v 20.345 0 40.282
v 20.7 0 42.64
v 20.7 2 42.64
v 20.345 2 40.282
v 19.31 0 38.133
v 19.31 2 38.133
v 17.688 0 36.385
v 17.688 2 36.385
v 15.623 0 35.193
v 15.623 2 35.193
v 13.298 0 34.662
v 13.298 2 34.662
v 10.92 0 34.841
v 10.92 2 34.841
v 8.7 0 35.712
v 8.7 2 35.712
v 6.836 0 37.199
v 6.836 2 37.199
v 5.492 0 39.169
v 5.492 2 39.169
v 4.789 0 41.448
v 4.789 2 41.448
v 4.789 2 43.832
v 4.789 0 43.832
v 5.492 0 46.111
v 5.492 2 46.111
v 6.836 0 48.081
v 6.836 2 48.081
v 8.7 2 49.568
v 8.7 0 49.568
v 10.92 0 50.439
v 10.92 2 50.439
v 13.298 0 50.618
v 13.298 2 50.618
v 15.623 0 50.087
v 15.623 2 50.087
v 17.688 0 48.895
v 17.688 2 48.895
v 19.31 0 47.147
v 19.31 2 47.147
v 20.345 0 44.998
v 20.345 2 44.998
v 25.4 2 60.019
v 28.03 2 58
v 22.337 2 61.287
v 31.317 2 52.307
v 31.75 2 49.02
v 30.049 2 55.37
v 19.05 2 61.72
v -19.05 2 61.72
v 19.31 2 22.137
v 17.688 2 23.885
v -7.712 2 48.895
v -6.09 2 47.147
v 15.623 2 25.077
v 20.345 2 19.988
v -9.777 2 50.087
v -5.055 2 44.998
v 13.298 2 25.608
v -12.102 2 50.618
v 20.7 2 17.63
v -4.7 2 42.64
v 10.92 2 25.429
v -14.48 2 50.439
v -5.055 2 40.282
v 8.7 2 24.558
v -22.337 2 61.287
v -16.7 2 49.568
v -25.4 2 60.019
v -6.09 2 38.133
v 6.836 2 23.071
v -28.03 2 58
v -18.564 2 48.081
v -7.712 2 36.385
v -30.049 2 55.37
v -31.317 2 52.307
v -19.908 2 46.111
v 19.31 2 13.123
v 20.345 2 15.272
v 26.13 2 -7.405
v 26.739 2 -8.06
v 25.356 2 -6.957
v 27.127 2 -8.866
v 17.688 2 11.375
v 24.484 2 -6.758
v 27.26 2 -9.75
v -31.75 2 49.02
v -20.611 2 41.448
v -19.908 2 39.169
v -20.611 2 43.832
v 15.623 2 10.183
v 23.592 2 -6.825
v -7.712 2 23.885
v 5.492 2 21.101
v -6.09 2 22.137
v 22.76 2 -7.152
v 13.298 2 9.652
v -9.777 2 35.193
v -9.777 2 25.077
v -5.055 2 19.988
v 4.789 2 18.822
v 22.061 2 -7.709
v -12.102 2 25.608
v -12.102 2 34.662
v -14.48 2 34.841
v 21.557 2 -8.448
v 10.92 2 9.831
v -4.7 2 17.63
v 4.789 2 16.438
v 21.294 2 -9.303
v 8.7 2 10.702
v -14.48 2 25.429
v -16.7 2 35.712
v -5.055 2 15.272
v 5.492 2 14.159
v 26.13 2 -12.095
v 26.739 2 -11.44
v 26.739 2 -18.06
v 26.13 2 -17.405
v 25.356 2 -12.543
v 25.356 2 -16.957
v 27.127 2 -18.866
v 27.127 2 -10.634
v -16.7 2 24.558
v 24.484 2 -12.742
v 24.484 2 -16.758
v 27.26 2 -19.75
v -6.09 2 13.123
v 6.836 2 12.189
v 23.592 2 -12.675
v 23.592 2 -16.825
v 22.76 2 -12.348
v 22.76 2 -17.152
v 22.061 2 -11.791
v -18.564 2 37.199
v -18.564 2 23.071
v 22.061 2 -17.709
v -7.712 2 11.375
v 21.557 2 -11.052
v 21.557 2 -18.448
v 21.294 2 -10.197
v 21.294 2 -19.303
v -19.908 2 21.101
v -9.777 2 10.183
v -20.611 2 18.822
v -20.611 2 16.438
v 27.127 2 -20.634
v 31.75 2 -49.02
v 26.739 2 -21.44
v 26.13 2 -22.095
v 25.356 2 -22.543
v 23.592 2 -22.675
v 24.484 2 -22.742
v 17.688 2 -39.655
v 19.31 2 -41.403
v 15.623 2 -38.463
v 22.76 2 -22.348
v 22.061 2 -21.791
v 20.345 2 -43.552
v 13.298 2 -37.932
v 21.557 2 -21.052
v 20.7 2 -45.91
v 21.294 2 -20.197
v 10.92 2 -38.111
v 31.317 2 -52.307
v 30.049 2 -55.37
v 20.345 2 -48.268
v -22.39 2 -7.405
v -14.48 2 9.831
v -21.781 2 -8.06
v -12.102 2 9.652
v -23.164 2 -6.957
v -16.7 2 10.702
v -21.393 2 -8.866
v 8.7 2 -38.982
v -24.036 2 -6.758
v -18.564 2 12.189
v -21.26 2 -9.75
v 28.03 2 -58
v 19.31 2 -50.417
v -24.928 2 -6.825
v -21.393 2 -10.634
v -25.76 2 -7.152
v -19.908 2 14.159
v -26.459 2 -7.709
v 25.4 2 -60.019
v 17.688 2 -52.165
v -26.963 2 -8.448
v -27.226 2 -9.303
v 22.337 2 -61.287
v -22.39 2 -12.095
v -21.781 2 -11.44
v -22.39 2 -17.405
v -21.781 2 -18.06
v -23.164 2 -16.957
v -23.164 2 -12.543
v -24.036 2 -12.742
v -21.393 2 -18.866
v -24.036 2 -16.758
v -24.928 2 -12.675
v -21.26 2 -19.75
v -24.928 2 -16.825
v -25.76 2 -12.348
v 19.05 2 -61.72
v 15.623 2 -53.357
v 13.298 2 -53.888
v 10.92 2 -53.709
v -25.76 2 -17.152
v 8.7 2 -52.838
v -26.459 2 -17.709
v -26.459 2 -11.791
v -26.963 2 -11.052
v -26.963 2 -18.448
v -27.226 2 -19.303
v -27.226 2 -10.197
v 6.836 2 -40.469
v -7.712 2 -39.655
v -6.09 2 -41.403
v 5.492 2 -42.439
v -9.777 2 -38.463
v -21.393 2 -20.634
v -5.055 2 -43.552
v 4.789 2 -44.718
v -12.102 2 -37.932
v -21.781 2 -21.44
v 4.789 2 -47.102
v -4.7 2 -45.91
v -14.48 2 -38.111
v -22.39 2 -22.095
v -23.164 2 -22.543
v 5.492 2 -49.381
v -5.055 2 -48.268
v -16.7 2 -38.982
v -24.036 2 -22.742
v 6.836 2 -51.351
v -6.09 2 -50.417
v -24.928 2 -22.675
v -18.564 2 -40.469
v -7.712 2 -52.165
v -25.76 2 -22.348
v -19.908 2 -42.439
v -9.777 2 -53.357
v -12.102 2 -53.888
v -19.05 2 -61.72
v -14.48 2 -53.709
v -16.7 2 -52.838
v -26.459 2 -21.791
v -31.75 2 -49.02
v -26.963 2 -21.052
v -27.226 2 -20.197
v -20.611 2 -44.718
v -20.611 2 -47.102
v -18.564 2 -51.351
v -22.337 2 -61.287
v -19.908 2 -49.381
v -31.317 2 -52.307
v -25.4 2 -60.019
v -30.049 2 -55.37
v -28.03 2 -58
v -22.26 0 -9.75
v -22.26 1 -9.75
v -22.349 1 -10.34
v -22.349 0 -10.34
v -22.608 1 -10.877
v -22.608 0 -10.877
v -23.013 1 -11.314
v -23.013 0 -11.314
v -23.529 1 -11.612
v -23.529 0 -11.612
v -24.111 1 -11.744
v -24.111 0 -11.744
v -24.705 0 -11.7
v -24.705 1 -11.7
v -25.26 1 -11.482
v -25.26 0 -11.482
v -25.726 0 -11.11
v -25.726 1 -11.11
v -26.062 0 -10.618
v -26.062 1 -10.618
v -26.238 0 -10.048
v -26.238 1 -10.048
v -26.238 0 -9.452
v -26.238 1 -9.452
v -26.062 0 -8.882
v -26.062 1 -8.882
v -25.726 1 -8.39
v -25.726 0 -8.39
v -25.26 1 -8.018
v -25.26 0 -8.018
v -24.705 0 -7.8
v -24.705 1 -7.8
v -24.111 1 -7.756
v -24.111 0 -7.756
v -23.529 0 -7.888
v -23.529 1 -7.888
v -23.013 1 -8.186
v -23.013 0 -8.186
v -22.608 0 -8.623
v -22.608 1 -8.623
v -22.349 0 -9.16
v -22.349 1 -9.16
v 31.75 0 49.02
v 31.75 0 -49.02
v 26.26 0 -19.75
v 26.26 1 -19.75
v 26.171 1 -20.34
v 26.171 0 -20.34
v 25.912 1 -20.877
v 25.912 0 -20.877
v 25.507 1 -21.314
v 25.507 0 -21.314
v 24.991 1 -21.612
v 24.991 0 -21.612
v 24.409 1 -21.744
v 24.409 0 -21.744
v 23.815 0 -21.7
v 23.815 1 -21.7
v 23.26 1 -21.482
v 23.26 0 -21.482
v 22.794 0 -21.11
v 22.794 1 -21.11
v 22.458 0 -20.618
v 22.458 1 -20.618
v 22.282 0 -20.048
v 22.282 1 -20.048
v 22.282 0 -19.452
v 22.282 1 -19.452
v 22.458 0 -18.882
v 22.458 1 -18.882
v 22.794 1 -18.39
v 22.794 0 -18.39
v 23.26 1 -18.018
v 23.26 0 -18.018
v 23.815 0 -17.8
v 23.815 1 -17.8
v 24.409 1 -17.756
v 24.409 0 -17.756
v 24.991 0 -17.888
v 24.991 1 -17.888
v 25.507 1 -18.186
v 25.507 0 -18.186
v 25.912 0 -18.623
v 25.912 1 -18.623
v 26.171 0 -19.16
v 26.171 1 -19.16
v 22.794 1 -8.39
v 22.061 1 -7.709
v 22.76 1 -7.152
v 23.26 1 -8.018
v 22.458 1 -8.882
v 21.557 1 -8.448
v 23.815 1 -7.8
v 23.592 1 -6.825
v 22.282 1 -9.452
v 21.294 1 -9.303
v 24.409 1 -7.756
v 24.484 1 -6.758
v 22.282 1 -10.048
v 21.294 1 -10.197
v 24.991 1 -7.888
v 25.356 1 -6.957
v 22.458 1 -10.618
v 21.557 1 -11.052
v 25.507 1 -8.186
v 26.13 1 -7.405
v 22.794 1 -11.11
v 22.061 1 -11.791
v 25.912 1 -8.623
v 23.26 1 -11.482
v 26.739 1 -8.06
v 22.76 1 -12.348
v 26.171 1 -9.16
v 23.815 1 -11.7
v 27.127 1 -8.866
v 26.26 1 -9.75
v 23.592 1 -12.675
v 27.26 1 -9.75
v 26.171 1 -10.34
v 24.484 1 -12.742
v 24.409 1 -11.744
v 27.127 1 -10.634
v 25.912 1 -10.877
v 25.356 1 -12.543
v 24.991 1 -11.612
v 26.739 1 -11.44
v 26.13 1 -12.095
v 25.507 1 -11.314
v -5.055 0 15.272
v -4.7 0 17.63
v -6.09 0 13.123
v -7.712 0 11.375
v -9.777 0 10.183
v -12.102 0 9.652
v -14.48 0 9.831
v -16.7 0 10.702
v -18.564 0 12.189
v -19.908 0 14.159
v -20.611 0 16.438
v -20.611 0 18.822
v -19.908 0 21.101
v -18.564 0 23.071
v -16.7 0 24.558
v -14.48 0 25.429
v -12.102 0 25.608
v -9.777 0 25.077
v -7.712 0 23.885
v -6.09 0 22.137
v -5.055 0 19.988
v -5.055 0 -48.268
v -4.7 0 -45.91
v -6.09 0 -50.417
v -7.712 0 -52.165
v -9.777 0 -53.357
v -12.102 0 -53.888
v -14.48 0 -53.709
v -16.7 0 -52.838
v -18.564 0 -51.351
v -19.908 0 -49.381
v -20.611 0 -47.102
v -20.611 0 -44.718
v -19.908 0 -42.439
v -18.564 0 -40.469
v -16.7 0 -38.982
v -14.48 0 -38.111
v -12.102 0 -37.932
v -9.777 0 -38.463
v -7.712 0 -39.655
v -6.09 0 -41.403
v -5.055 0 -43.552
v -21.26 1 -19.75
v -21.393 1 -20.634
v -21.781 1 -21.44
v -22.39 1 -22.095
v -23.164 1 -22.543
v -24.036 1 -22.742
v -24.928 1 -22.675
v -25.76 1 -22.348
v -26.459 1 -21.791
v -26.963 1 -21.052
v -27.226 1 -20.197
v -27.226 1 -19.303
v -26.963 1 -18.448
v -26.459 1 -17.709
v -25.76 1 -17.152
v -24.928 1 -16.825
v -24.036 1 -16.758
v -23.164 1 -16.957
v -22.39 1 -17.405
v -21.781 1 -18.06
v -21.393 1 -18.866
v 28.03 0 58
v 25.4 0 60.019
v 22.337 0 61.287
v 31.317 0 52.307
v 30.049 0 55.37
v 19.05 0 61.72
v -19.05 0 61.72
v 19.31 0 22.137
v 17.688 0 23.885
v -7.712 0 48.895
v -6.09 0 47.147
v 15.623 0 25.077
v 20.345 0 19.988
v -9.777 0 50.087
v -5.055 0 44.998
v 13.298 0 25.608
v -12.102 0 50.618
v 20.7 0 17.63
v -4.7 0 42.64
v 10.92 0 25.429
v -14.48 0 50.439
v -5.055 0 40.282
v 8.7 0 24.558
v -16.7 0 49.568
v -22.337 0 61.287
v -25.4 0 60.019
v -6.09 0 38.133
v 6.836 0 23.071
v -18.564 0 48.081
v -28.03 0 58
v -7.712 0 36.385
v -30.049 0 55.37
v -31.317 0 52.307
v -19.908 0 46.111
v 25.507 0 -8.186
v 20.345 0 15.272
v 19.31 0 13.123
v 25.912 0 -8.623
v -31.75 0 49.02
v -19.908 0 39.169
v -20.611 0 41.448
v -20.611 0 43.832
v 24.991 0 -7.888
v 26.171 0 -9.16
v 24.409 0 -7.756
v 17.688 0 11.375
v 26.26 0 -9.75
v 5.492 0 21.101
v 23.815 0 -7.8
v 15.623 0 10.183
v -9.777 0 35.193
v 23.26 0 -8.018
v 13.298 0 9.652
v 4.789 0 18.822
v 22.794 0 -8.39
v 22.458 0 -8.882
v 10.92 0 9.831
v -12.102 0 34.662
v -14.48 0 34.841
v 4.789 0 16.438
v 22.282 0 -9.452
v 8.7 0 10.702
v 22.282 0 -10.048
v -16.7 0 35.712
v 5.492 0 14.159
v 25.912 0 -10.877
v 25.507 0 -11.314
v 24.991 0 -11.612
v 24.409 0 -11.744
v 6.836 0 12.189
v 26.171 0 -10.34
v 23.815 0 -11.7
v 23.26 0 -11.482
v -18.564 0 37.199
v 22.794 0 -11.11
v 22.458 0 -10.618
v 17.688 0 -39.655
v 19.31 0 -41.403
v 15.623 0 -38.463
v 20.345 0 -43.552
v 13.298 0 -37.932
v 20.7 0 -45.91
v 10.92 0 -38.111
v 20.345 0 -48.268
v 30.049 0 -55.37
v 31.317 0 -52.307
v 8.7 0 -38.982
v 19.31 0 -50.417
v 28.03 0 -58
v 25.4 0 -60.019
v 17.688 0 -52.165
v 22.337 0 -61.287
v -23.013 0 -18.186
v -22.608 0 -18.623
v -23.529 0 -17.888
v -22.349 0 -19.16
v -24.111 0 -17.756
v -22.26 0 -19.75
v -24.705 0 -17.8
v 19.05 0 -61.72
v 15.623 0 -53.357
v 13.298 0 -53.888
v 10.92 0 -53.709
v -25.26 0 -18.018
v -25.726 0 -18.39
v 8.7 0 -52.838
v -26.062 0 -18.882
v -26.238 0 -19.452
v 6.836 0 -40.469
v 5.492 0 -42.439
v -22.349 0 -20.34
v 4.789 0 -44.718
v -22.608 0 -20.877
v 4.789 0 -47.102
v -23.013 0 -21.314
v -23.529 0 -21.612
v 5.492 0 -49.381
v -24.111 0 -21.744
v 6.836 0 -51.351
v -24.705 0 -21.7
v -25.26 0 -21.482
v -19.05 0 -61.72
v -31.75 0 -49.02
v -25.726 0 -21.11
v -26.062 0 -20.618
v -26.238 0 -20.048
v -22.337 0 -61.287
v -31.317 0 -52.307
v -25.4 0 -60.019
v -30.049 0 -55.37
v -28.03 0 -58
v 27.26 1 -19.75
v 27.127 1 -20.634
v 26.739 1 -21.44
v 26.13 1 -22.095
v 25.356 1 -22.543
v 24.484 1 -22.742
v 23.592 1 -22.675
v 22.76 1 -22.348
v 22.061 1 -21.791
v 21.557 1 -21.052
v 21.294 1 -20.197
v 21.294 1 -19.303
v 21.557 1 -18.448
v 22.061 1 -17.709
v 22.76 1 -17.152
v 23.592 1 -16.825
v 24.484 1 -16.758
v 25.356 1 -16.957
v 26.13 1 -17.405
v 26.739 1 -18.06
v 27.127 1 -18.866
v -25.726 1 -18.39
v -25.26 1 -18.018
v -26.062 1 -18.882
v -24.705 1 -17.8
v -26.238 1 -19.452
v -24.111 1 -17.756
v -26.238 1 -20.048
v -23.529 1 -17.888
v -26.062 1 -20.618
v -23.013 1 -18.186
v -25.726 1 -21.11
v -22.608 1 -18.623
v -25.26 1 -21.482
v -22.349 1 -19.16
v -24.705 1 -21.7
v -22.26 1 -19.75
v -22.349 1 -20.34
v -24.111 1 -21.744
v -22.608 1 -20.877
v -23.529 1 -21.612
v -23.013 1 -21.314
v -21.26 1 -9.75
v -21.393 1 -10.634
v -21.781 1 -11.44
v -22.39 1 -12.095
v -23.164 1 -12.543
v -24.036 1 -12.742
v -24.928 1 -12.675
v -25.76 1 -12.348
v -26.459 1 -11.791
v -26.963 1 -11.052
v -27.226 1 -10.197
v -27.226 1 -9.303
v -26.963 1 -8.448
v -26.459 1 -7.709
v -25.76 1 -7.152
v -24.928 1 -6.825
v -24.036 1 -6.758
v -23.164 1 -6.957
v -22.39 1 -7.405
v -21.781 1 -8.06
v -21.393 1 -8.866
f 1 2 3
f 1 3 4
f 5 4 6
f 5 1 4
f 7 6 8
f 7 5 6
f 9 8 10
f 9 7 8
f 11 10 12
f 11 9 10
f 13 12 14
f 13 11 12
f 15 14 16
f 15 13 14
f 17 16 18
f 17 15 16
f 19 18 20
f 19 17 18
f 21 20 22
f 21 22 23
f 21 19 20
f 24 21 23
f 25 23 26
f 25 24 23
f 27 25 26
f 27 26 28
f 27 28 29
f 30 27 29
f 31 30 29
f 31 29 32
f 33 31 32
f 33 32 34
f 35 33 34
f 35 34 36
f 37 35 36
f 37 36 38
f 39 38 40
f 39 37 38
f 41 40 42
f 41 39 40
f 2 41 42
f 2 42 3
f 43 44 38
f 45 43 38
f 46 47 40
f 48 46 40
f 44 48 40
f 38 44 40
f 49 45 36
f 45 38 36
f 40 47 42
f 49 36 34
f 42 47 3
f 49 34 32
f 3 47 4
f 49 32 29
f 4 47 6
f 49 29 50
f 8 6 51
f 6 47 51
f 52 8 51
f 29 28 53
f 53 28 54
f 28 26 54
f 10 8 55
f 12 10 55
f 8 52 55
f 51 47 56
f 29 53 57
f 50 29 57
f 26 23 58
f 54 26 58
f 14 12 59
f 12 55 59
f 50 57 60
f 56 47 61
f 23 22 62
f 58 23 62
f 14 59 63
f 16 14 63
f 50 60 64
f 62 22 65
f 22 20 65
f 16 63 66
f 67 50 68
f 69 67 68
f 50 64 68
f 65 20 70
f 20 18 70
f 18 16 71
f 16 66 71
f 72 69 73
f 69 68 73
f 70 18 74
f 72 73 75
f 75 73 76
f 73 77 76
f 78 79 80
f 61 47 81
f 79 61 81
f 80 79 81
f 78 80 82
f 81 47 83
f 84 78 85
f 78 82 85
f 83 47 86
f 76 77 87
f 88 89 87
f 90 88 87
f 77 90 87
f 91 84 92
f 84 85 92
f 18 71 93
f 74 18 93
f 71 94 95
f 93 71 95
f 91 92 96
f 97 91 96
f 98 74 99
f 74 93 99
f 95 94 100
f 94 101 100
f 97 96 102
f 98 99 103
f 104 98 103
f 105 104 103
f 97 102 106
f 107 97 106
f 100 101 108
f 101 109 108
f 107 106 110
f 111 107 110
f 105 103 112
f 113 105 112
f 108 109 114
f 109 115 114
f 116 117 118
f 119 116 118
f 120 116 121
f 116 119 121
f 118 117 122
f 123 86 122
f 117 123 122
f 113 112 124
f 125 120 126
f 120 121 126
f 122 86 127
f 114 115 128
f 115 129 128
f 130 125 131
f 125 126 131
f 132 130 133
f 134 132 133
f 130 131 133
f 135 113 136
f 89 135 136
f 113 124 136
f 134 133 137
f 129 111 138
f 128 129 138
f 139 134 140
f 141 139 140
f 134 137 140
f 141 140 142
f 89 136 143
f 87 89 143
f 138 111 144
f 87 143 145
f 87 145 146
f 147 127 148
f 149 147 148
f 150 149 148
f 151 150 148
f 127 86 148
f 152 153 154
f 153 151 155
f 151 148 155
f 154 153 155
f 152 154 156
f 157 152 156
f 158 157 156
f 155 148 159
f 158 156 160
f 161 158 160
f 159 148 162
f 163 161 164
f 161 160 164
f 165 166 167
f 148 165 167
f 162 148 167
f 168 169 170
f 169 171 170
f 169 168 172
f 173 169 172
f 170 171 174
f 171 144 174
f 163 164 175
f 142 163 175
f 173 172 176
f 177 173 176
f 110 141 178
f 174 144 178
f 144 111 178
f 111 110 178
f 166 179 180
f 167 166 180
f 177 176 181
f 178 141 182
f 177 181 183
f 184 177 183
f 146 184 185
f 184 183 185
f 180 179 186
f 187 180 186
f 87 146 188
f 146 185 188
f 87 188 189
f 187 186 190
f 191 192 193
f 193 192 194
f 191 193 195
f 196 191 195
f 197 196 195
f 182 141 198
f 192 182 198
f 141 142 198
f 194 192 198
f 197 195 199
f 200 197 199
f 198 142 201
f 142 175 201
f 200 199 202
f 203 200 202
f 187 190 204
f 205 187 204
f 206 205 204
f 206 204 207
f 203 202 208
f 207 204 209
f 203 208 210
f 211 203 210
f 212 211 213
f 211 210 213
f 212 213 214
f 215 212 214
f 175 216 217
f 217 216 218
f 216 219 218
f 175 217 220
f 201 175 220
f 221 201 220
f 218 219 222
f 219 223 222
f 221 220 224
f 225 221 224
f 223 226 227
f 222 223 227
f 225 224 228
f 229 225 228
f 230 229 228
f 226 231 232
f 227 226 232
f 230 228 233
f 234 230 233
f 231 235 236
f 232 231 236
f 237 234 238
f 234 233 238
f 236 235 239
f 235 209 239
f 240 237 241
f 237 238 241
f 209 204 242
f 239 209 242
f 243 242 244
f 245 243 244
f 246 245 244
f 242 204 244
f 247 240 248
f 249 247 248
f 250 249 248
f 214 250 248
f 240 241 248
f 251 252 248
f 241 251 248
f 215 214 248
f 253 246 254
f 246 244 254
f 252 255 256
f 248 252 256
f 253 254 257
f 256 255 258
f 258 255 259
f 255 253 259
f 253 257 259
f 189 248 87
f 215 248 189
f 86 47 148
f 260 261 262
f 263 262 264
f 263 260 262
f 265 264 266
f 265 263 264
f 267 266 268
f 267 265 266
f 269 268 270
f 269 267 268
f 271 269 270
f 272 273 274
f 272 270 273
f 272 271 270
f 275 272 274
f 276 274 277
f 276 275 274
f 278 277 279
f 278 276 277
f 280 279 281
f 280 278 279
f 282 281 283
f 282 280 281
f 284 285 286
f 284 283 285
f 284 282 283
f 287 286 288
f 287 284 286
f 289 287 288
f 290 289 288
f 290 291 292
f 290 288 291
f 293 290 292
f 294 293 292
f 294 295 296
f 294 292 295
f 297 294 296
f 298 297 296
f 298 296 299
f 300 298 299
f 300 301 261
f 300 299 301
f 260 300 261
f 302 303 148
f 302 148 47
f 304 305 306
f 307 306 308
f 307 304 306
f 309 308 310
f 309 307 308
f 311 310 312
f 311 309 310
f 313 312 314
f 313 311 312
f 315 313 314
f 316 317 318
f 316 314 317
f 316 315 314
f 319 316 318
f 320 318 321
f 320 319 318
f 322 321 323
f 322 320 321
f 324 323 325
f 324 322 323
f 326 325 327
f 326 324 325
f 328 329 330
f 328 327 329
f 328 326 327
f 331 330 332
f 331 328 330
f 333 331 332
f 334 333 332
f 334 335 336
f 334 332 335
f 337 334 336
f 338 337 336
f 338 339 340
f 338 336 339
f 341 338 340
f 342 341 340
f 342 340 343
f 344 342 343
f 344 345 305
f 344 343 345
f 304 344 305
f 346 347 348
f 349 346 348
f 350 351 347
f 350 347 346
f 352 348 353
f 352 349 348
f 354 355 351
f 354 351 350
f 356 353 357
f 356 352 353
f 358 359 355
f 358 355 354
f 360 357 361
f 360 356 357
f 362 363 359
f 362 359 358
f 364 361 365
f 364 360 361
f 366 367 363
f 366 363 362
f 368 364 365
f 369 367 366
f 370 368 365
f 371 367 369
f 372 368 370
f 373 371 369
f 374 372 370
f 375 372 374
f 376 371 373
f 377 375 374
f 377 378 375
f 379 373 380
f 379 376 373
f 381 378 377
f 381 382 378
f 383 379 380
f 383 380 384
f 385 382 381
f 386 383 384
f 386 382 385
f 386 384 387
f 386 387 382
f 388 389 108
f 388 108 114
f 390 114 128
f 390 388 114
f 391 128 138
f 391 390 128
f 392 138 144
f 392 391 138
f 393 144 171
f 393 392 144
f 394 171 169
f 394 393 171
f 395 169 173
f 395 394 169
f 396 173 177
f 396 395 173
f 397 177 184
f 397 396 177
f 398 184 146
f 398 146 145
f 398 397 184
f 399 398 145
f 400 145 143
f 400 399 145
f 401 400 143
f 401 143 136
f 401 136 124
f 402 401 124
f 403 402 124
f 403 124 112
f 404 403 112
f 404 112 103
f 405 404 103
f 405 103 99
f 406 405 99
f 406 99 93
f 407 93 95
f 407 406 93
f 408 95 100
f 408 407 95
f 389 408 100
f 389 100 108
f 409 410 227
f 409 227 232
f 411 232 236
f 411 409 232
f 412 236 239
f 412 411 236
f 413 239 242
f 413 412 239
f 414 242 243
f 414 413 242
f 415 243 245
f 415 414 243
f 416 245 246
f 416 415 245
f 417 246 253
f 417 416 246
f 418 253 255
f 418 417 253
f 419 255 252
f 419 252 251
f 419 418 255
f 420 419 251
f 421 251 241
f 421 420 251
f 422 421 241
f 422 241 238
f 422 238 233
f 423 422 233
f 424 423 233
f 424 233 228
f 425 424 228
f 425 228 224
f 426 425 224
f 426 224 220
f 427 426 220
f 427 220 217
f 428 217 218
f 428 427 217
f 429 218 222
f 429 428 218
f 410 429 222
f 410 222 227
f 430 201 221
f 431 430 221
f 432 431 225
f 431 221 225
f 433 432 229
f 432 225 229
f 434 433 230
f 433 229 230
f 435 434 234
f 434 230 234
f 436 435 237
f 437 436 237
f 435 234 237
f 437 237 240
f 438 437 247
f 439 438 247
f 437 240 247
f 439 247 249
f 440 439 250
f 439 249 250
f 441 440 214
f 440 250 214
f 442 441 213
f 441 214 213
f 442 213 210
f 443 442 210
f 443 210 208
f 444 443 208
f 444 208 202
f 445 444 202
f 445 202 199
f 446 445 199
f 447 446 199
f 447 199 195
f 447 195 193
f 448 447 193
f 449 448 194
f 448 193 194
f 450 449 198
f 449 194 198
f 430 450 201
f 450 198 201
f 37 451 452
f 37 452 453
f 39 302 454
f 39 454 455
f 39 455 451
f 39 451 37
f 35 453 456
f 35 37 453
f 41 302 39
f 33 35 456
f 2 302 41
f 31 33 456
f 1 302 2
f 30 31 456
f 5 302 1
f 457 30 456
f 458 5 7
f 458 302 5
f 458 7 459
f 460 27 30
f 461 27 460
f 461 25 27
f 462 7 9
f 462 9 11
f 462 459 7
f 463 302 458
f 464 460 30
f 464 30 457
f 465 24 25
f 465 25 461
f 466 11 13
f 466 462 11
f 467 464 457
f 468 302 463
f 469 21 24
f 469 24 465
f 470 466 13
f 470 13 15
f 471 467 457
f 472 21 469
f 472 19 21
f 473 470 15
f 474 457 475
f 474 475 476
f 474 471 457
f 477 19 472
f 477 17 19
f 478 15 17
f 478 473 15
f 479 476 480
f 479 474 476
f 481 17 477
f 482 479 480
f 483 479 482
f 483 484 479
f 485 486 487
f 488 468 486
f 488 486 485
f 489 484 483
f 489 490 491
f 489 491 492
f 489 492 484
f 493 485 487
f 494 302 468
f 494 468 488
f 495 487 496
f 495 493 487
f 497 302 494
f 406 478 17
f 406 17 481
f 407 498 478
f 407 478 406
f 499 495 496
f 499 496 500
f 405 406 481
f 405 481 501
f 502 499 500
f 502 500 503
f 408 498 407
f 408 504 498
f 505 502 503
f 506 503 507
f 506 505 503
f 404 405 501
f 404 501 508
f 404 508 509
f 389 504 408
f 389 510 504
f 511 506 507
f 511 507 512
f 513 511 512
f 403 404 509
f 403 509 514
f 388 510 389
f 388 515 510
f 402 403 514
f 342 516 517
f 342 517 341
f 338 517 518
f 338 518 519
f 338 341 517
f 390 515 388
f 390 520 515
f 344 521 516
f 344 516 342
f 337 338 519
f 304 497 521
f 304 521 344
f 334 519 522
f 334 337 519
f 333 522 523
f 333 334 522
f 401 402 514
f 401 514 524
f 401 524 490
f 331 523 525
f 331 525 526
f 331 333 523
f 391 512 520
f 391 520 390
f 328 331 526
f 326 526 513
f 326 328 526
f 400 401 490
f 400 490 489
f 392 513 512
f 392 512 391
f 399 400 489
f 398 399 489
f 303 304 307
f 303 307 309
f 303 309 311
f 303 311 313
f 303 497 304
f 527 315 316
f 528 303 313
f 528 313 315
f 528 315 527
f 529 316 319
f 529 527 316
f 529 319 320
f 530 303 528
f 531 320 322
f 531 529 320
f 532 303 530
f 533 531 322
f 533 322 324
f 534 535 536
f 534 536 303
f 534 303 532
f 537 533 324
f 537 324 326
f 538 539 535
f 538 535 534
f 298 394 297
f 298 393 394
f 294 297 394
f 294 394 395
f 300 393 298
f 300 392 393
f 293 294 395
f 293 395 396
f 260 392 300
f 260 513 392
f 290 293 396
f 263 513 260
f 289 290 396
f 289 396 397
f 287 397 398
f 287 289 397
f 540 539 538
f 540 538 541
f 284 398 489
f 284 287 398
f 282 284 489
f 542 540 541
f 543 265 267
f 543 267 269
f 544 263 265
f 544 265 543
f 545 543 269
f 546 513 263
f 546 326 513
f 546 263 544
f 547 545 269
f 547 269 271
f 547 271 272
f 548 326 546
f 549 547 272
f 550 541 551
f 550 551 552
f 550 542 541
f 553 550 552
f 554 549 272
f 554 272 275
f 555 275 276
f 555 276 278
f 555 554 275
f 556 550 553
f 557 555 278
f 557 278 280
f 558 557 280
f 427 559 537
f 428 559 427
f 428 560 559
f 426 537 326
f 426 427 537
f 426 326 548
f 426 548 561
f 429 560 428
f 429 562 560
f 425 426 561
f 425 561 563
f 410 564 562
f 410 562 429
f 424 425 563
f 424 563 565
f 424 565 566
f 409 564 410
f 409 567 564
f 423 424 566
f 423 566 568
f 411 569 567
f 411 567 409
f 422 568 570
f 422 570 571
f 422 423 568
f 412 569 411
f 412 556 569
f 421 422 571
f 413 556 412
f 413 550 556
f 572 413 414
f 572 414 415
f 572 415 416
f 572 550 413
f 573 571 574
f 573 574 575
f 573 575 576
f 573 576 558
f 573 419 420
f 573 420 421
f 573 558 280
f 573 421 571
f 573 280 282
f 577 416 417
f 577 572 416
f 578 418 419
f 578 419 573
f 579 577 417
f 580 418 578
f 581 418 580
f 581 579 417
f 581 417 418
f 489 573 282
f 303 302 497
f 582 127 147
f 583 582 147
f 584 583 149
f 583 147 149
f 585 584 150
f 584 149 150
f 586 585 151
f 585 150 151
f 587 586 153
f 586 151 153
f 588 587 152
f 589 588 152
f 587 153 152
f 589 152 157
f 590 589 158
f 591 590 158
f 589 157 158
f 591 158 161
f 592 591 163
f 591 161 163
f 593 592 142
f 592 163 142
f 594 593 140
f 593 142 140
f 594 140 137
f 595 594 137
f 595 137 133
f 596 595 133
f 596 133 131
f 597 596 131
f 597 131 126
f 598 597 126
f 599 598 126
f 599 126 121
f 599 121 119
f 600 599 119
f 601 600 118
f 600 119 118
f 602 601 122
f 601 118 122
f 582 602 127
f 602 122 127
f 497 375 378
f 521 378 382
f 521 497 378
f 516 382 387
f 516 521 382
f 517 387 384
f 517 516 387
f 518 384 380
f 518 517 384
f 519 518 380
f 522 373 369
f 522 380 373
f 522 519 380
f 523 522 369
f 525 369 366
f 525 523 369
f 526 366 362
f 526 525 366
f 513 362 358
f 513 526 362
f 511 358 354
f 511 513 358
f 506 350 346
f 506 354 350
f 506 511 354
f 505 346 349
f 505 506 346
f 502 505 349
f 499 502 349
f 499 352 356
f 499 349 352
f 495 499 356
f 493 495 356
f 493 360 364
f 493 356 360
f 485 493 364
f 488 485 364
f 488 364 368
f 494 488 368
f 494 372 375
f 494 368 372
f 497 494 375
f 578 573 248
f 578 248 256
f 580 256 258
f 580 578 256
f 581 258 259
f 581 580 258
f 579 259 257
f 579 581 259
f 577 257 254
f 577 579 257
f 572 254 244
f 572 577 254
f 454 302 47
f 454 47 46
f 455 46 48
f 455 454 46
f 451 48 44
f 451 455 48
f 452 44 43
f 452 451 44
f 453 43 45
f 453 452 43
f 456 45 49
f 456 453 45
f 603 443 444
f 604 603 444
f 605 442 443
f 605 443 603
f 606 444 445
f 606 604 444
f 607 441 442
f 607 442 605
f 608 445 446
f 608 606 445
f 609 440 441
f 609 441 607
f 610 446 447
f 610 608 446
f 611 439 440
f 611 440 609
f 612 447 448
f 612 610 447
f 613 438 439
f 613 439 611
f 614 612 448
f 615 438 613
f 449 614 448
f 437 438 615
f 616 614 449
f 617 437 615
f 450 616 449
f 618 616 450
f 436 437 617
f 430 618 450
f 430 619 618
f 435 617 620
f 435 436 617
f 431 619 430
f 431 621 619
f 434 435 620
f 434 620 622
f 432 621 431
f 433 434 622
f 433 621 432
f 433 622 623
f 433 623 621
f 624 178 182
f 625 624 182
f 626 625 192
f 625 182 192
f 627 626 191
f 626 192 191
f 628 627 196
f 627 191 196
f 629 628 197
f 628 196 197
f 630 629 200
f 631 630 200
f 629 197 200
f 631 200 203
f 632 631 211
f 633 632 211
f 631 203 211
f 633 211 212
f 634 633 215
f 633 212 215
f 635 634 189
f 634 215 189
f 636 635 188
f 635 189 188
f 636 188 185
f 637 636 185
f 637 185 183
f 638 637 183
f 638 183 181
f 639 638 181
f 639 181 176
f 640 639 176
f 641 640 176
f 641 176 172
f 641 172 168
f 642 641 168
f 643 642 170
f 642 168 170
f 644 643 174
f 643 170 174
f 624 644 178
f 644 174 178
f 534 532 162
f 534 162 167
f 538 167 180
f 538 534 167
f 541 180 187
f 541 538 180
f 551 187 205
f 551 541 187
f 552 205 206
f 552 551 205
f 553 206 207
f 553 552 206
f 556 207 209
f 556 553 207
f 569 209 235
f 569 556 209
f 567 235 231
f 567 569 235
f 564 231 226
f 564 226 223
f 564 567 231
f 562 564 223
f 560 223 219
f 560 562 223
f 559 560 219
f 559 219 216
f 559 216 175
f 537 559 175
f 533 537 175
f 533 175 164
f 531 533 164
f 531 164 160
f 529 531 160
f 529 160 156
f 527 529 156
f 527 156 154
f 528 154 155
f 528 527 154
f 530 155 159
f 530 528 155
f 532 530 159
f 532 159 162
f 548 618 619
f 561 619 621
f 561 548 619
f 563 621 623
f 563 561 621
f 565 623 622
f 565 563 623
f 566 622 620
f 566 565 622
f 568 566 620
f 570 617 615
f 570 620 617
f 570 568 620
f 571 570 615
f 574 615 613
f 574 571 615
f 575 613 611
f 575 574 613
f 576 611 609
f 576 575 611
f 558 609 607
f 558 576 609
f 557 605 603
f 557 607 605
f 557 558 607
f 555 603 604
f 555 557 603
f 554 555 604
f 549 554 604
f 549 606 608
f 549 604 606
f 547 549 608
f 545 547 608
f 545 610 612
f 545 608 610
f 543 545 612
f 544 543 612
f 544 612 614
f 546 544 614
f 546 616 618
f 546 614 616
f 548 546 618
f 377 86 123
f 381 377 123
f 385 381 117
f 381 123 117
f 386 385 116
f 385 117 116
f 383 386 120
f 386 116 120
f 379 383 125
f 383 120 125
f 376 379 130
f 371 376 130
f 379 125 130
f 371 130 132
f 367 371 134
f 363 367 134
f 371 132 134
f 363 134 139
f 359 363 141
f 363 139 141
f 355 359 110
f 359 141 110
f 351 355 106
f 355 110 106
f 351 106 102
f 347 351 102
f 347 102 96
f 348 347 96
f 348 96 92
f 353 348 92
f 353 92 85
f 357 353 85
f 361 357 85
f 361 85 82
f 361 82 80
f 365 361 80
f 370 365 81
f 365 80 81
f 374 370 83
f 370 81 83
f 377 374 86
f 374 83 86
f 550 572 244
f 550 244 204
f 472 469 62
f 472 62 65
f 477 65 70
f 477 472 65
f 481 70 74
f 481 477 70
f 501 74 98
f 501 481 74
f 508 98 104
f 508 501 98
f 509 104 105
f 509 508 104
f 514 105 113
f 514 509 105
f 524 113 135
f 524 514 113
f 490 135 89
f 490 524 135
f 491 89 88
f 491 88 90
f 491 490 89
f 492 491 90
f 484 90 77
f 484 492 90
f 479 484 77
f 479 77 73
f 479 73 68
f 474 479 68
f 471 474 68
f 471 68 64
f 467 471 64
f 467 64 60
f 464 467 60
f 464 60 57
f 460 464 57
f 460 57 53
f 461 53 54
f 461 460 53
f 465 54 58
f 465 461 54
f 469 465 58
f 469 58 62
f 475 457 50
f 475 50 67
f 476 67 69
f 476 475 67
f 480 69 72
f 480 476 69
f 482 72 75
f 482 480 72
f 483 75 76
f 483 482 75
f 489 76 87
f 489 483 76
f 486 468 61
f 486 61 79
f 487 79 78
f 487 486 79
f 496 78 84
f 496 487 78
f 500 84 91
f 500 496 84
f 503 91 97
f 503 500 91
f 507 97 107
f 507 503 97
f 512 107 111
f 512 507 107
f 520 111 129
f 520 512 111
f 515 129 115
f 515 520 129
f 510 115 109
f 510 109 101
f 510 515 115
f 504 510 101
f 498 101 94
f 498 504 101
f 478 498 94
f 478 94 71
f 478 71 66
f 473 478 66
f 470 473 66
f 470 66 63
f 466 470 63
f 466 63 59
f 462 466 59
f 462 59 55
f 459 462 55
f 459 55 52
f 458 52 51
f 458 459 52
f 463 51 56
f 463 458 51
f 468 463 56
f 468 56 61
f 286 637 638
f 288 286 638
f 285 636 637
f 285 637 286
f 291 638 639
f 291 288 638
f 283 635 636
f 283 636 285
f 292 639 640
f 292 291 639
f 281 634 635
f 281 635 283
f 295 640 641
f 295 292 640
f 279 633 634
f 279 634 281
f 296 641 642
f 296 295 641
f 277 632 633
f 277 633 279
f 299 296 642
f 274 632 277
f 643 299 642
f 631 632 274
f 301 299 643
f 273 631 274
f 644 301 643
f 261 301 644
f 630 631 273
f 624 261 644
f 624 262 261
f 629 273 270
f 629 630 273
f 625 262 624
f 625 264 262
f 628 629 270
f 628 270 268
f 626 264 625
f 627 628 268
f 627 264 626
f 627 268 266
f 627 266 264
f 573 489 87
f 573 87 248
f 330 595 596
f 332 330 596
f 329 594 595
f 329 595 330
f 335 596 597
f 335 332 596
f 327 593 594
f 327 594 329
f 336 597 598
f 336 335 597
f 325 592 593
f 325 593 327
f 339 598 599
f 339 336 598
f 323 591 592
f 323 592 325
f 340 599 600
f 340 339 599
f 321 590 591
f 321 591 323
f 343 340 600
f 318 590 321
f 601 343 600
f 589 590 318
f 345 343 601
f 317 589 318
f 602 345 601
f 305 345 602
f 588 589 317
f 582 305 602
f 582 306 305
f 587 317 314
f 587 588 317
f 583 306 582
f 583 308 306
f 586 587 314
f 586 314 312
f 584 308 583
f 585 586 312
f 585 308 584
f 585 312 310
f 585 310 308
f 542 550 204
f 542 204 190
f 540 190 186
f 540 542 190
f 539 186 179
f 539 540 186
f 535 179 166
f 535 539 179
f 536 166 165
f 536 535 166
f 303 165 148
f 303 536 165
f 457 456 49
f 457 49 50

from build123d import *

# Parameters (mm, degrees)
SKETCH1_R           = 8
SKETCH1_R_2         = 2
BOSS_EXTRUDE1_DEPTH = 2
SKETCH2_R           = 3
CUT_EXTRUDE1_DEPTH  = 1


with BuildPart() as part:
    # Sketch1 → Boss-Extrude1 (new body)
    with BuildSketch(Plane(origin=(0, 0, 0), x_dir=(1, 0, 0), z_dir=(0, 1, 0))):
        with BuildLine():
            Line((19.05, -61.72), (-19.05, -61.72))
            ThreePointArc((-19.05, -61.72), (-28.030256121, -58.000256121), (-31.75, -49.02))
            Line((-31.75, -49.02), (-31.75, 49.02))
            ThreePointArc((-31.75, 49.02), (-28.030256121, 58.000256121), (-19.05, 61.72))
            Line((-19.05, 61.72), (19.05, 61.72))
            ThreePointArc((19.05, 61.72), (28.030256121, 58.000256121), (31.75, 49.02))
            Line((31.75, 49.02), (31.75, -49.02))
            ThreePointArc((31.75, -49.02), (28.030256121, -58.000256121), (19.05, -61.72))
        make_face()
        with Locations((-12.7, 45.91)):
            Circle(SKETCH1_R, mode=Mode.SUBTRACT)
        with Locations((12.7, 45.91)):
            Circle(SKETCH1_R, mode=Mode.SUBTRACT)
        with Locations((-12.7, -42.64)):
            Circle(SKETCH1_R, mode=Mode.SUBTRACT)
        with Locations((12.7, -42.64)):
            Circle(SKETCH1_R, mode=Mode.SUBTRACT)
        with Locations((12.7, -17.63)):
            Circle(SKETCH1_R, mode=Mode.SUBTRACT)
        with Locations((-12.7, -17.63)):
            Circle(SKETCH1_R, mode=Mode.SUBTRACT)
        with Locations((-24.26, 19.75)):
            Circle(SKETCH1_R_2, mode=Mode.SUBTRACT)
        with Locations((-24.26, 9.75)):
            Circle(SKETCH1_R_2, mode=Mode.SUBTRACT)
        with Locations((24.26, 19.75)):
            Circle(SKETCH1_R_2, mode=Mode.SUBTRACT)
        with Locations((24.26, 9.75)):
            Circle(SKETCH1_R_2, mode=Mode.SUBTRACT)
    extrude(amount=BOSS_EXTRUDE1_DEPTH)

    # Sketch2 → Cut-Extrude1 (cut)
    with BuildSketch(Plane(origin=(0, 2, 0), x_dir=(1, 0, 0), z_dir=(0, 1, 0))):
        with Locations((-24.26, 19.75)):
            Circle(SKETCH2_R)
        with Locations((-24.26, 9.75)):
            Circle(SKETCH2_R)
        with Locations((24.26, 19.75)):
            Circle(SKETCH2_R)
        with Locations((24.26, 9.75)):
            Circle(SKETCH2_R)
    extrude(amount=-CUT_EXTRUDE1_DEPTH, mode=Mode.SUBTRACT)


solid = part.part
